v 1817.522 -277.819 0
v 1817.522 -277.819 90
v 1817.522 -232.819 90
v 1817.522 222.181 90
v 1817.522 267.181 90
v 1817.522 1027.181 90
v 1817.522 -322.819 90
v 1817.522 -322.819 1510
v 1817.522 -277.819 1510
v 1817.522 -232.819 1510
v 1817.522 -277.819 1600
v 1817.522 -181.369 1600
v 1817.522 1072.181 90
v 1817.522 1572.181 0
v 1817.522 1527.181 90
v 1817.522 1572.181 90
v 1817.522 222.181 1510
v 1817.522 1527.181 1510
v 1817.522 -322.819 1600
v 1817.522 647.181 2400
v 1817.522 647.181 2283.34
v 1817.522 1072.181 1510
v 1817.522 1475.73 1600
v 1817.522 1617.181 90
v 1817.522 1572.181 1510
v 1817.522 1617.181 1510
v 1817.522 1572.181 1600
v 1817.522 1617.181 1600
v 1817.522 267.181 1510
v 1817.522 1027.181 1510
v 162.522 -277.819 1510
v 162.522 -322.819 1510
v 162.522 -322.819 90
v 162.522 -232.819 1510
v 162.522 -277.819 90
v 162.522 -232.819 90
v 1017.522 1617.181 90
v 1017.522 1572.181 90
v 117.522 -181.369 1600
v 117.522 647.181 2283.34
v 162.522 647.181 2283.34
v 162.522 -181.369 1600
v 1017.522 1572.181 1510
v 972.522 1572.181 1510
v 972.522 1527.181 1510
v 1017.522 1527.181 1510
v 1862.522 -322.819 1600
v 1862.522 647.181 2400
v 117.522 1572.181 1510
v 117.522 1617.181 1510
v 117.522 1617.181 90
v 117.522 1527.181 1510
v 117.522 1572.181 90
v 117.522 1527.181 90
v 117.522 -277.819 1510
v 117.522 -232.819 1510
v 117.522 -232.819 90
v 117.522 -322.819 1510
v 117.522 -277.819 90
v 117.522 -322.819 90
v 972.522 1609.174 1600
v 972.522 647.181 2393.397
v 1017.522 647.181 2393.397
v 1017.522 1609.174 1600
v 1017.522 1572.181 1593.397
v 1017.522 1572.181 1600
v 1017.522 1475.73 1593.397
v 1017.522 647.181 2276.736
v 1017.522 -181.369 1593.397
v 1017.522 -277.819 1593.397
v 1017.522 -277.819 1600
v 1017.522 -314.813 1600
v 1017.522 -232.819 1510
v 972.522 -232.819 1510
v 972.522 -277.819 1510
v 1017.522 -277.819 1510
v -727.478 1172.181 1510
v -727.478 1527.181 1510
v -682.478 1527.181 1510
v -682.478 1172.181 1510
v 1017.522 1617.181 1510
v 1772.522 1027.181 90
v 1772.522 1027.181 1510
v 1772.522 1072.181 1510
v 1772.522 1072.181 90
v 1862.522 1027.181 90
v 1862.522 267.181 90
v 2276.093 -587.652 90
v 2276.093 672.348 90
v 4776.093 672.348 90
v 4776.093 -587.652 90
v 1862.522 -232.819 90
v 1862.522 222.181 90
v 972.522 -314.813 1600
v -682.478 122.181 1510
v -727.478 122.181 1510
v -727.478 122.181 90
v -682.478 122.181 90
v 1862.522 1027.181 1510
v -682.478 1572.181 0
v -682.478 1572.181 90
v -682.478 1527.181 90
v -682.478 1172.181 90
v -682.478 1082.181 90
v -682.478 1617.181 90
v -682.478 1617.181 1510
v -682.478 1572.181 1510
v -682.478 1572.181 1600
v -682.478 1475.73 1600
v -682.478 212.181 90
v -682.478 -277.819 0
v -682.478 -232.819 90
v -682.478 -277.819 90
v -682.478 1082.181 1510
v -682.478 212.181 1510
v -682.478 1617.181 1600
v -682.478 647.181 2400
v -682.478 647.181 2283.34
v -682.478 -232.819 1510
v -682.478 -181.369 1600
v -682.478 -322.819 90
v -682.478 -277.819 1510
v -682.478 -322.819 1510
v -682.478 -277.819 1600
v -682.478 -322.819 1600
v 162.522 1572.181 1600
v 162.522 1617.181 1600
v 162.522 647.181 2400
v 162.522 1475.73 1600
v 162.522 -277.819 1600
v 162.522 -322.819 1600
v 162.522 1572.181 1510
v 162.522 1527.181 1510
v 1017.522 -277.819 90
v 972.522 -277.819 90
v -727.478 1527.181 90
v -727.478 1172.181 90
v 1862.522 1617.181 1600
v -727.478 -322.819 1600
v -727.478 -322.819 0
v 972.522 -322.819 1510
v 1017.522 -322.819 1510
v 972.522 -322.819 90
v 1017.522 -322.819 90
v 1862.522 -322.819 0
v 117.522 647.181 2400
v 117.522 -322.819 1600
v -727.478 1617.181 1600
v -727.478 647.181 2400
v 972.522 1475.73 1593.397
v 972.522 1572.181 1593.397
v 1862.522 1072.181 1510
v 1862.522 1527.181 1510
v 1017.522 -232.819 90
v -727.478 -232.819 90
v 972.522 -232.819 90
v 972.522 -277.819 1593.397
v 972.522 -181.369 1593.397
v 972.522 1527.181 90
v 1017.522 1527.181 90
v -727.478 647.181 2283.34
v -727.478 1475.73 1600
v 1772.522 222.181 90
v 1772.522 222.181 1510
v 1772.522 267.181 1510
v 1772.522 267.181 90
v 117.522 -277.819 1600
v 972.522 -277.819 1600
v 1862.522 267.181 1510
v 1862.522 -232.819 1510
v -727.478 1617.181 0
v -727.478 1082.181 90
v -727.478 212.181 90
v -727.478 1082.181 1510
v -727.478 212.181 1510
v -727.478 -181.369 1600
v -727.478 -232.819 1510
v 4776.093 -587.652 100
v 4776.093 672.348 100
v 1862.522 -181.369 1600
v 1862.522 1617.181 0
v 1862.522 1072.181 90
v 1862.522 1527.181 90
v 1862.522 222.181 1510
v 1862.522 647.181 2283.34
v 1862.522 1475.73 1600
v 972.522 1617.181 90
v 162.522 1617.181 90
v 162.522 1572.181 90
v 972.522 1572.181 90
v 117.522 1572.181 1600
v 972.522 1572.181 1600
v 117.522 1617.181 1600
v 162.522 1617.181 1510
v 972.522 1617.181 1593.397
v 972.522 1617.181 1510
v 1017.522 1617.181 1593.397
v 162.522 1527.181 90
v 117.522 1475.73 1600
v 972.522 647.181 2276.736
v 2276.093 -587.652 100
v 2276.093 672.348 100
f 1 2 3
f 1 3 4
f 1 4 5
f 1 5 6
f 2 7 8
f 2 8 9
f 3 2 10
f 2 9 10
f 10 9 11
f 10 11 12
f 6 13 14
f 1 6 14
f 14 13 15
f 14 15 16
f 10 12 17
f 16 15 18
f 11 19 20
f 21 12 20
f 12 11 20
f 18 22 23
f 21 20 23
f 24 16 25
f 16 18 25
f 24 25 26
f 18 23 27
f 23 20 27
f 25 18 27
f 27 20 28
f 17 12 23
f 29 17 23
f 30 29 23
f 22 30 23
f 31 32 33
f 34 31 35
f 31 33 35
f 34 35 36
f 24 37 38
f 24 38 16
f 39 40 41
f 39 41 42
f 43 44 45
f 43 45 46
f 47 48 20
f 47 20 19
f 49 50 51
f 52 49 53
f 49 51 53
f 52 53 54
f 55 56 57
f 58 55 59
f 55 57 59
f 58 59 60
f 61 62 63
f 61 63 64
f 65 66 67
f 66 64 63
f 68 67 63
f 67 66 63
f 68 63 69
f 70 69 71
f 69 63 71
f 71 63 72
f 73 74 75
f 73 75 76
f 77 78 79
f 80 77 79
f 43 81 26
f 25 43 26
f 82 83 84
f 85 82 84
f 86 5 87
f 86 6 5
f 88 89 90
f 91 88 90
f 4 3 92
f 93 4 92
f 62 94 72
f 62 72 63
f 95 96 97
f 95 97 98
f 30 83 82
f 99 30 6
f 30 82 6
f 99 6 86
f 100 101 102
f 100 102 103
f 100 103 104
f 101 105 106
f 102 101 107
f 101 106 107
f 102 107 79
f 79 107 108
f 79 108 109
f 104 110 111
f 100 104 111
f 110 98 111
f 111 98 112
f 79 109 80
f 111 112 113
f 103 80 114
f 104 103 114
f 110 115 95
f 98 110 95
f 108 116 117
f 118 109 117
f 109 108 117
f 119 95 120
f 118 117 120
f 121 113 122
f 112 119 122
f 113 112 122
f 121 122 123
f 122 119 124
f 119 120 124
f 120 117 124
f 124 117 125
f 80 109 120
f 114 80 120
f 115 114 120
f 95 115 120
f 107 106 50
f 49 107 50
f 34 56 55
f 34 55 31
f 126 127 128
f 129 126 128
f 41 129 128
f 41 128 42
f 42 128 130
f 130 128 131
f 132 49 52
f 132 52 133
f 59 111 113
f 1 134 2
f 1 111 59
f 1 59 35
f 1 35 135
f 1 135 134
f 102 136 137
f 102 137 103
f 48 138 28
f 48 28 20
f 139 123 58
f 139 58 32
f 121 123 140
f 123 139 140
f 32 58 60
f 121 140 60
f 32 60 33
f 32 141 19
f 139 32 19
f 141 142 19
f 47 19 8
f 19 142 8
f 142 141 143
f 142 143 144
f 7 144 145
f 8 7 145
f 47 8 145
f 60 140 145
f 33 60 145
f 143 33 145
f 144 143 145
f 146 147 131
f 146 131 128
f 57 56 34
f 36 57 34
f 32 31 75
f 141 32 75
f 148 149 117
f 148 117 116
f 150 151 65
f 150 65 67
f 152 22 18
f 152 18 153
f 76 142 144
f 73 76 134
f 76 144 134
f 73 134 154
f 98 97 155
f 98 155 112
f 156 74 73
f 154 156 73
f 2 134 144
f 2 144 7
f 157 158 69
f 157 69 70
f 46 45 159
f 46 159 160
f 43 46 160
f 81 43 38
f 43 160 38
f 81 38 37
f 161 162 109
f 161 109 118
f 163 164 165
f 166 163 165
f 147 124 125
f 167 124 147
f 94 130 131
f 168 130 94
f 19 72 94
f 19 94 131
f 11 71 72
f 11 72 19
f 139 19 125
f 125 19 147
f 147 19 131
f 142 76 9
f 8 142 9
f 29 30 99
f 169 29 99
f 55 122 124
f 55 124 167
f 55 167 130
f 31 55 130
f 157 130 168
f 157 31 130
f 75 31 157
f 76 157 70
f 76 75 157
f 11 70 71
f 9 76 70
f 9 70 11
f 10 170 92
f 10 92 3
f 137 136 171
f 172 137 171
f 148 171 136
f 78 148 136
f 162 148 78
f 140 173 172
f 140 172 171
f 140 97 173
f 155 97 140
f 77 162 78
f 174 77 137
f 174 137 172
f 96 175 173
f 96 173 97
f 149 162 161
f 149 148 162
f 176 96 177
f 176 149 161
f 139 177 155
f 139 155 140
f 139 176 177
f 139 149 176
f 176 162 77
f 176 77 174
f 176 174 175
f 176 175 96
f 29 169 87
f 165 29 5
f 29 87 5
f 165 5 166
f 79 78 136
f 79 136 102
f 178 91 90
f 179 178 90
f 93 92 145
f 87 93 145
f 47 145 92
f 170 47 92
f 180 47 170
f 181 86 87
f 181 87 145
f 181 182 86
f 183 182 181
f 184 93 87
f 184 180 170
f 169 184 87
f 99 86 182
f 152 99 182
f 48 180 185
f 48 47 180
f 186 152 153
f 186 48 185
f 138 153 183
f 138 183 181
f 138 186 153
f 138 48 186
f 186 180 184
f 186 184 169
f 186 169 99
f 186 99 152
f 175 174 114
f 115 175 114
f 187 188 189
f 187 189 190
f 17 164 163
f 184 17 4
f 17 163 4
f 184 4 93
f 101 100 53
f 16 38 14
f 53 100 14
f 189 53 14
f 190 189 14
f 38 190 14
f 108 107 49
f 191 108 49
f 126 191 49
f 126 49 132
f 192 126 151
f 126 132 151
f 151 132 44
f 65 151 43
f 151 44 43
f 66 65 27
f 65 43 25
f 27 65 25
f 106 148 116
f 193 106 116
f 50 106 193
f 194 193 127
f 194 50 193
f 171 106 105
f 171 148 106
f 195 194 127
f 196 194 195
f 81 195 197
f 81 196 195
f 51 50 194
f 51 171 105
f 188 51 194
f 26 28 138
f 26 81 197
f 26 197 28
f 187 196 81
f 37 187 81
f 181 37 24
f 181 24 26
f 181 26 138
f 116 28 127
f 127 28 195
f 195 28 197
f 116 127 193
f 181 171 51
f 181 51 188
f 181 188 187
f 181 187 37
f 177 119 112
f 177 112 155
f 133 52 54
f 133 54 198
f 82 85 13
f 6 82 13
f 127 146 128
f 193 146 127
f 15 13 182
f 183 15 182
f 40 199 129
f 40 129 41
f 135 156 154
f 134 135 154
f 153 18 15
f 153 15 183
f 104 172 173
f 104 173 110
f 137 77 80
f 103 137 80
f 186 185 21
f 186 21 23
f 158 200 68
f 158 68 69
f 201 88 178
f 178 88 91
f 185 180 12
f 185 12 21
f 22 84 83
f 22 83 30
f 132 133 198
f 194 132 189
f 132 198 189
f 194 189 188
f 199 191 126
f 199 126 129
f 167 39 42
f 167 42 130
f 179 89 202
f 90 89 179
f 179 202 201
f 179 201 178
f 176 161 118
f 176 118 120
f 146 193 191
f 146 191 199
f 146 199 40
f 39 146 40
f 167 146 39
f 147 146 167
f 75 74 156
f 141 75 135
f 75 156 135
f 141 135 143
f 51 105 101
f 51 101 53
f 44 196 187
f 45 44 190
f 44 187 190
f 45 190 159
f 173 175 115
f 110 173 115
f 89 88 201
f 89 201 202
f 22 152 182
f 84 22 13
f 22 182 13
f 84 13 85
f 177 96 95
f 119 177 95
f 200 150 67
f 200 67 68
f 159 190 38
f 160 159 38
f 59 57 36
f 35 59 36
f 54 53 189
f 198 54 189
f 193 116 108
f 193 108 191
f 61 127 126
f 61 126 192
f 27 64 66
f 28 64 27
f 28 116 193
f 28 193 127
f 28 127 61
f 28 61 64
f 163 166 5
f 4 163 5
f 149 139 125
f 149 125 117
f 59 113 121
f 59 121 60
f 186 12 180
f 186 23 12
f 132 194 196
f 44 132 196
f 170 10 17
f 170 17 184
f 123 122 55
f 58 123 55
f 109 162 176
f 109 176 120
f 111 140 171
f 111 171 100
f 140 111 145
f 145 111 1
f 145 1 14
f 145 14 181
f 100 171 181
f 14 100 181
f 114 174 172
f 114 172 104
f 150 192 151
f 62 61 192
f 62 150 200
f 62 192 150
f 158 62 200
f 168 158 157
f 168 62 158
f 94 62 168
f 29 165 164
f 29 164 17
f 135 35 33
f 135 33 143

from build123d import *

# Parameters (mm, degrees)
F0_W      = 2590
F0_H      = 1940
F0_W_2    = 2500
F0_H_2    = 1850
F1_DEPTH  = 90
F2_W      = 45
F2_H      = 90
F2_H_2    = 45
F3_DEPTH  = 1420
F4_W      = 2590
F4_H      = 1940
F4_W_2    = 2500
F4_H_2    = 1850
F5_DEPTH  = 90
F7_DEPTH  = 45
F9_DEPTH  = 45
F11_DEPTH = 45
F13_DEPTH = 45
F14_W     = 2500
F14_H     = 1260
F15_DEPTH = 10


with BuildPart() as f1:
    # F0 (on Top) → F1 (new body)
    with BuildSketch(Plane.XY):
        with Locations((567.521992058, 647.1808014655)):
            Rectangle(F0_W, F0_H)
        with Locations((567.521992058, 647.1808014655)):
            Rectangle(F0_W_2, F0_H_2, mode=Mode.SUBTRACT)
    extrude(amount=F1_DEPTH)

    # F2 (on face) → F3 (join)
    with BuildSketch(Plane.XY.offset(90)):
        with Locations((-704.978007942, 1127.1808014655)):
            Rectangle(F2_W, F2_H)
        with Locations((-704.978007942, 167.1808014655)):
            Rectangle(F2_W, F2_H)
        Polygon((-727.478007942, -232.8191985345), (-727.478007942, -322.8191985345), (-682.478007942, -322.8191985345), (-682.478007942, -277.8191985345), (-682.478007942, -232.8191985345), align=None)
        with Locations((140.021992058, -255.3191985345)):
            Rectangle(F2_W, F2_H_2)
        with Locations((140.021992058, -300.3191985345)):
            Rectangle(F2_W, F2_H_2)
        with Locations((995.021992058, -255.3191985345)):
            Rectangle(F2_W, F2_H_2)
        with Locations((995.021992058, -300.3191985345)):
            Rectangle(F2_W, F2_H_2)
        Polygon((1817.521992058, -277.8191985345), (1817.521992058, -322.8191985345), (1862.521992058, -322.8191985345), (1862.521992058, -232.8191985345), (1817.521992058, -232.8191985345), align=None)
        with Locations((1795.021992058, 244.6808014655)):
            Rectangle(F2_W, F2_H_2)
        with Locations((1840.021992058, 244.6808014655)):
            Rectangle(F2_W, F2_H_2)
        with Locations((1795.021992058, 1049.6808014655)):
            Rectangle(F2_W, F2_H_2)
        with Locations((1840.021992058, 1049.6808014655)):
            Rectangle(F2_W, F2_H_2)
        Polygon((1817.521992058, 1572.1808014655), (1817.521992058, 1527.1808014655), (1862.521992058, 1527.1808014655), (1862.521992058, 1617.1808014655), (1817.521992058, 1617.1808014655), align=None)
        with Locations((995.021992058, 1594.6808014655)):
            Rectangle(F2_W, F2_H_2)
        with Locations((995.021992058, 1549.6808014655)):
            Rectangle(F2_W, F2_H_2)
        with Locations((140.021992058, 1594.6808014655)):
            Rectangle(F2_W, F2_H_2)
        with Locations((140.021992058, 1549.6808014655)):
            Rectangle(F2_W, F2_H_2)
        Polygon((-727.478007942, 1617.1808014655), (-727.478007942, 1527.1808014655), (-682.478007942, 1527.1808014655), (-682.478007942, 1572.1808014655), (-682.478007942, 1617.1808014655), align=None)
    extrude(amount=F3_DEPTH)

    # F4 (on face) → F5 (join)
    with BuildSketch(Plane.XY.offset(1510)):
        with Locations((567.521992058, 647.1808014655)):
            Rectangle(F4_W, F4_H)
        with Locations((567.521992058, 647.1808014655)):
            Rectangle(F4_W_2, F4_H_2, mode=Mode.SUBTRACT)
    extrude(amount=F5_DEPTH)

    # F6 (on face) → F7 (join)
    with BuildSketch(Plane.YZ.offset(1862.521992058)):
        Polygon((647.1808014655, 2400), (-322.8191985345, 1600), (-181.3686219185, 1600), (647.1808014655, 2283.339730626), (1475.7302248495, 1600), (1617.1808014655, 1600), align=None)
    extrude(amount=-F7_DEPTH)

    # F8 (on face) → F9 (join)
    with BuildSketch(Plane(origin=(972.521992058, 0, 0), x_dir=(0, -1, 0), z_dir=(-1, 0, 0))):
        Polygon((-647.1808242798, 2393.3965783884), (-1617.1808242798, 1593.3965783884), (-1475.7302476638, 1593.3965783884), (-647.1808242798, 2276.7363090144), (181.3685991042, 1593.3965783884), (322.8191757202, 1593.3965783884), align=None)
    extrude(amount=-F9_DEPTH)

    # F10 (on face) → F11 (join)
    with BuildSketch(Plane(origin=(117.521992058, 0, 0), x_dir=(0, -1, 0), z_dir=(-1, 0, 0))):
        Polygon((-647.1808242798, 2399.9999046326), (-1617.1808242798, 1599.9999046326), (-1475.7302476638, 1599.9999046326), (-647.1808242798, 2283.3396352585), (181.3685991042, 1599.9999046326), (322.8191757202, 1599.9999046326), align=None)
    extrude(amount=-F11_DEPTH)

    # F12 (on face) → F13 (join)
    with BuildSketch(Plane(origin=(-727.478007942, 0, 0), x_dir=(0, -1, 0), z_dir=(-1, 0, 0))):
        Polygon((-647.1808242798, 2400), (-1617.1808242798, 1600), (-1475.7302476638, 1600), (-647.1808242798, 2283.339730626), (181.3685991042, 1600), (322.8191757202, 1600), align=None)
    extrude(amount=-F13_DEPTH)


with BuildPart() as f15:
    # F14 (on face) → F15 (new body)
    with BuildSketch(Plane.XY.offset(90)):
        with Locations((3526.0927677155, 42.3482188576)):
            Rectangle(F14_W, F14_H)
    extrude(amount=F15_DEPTH)


solid = Compound([f1.part, f15.part])
